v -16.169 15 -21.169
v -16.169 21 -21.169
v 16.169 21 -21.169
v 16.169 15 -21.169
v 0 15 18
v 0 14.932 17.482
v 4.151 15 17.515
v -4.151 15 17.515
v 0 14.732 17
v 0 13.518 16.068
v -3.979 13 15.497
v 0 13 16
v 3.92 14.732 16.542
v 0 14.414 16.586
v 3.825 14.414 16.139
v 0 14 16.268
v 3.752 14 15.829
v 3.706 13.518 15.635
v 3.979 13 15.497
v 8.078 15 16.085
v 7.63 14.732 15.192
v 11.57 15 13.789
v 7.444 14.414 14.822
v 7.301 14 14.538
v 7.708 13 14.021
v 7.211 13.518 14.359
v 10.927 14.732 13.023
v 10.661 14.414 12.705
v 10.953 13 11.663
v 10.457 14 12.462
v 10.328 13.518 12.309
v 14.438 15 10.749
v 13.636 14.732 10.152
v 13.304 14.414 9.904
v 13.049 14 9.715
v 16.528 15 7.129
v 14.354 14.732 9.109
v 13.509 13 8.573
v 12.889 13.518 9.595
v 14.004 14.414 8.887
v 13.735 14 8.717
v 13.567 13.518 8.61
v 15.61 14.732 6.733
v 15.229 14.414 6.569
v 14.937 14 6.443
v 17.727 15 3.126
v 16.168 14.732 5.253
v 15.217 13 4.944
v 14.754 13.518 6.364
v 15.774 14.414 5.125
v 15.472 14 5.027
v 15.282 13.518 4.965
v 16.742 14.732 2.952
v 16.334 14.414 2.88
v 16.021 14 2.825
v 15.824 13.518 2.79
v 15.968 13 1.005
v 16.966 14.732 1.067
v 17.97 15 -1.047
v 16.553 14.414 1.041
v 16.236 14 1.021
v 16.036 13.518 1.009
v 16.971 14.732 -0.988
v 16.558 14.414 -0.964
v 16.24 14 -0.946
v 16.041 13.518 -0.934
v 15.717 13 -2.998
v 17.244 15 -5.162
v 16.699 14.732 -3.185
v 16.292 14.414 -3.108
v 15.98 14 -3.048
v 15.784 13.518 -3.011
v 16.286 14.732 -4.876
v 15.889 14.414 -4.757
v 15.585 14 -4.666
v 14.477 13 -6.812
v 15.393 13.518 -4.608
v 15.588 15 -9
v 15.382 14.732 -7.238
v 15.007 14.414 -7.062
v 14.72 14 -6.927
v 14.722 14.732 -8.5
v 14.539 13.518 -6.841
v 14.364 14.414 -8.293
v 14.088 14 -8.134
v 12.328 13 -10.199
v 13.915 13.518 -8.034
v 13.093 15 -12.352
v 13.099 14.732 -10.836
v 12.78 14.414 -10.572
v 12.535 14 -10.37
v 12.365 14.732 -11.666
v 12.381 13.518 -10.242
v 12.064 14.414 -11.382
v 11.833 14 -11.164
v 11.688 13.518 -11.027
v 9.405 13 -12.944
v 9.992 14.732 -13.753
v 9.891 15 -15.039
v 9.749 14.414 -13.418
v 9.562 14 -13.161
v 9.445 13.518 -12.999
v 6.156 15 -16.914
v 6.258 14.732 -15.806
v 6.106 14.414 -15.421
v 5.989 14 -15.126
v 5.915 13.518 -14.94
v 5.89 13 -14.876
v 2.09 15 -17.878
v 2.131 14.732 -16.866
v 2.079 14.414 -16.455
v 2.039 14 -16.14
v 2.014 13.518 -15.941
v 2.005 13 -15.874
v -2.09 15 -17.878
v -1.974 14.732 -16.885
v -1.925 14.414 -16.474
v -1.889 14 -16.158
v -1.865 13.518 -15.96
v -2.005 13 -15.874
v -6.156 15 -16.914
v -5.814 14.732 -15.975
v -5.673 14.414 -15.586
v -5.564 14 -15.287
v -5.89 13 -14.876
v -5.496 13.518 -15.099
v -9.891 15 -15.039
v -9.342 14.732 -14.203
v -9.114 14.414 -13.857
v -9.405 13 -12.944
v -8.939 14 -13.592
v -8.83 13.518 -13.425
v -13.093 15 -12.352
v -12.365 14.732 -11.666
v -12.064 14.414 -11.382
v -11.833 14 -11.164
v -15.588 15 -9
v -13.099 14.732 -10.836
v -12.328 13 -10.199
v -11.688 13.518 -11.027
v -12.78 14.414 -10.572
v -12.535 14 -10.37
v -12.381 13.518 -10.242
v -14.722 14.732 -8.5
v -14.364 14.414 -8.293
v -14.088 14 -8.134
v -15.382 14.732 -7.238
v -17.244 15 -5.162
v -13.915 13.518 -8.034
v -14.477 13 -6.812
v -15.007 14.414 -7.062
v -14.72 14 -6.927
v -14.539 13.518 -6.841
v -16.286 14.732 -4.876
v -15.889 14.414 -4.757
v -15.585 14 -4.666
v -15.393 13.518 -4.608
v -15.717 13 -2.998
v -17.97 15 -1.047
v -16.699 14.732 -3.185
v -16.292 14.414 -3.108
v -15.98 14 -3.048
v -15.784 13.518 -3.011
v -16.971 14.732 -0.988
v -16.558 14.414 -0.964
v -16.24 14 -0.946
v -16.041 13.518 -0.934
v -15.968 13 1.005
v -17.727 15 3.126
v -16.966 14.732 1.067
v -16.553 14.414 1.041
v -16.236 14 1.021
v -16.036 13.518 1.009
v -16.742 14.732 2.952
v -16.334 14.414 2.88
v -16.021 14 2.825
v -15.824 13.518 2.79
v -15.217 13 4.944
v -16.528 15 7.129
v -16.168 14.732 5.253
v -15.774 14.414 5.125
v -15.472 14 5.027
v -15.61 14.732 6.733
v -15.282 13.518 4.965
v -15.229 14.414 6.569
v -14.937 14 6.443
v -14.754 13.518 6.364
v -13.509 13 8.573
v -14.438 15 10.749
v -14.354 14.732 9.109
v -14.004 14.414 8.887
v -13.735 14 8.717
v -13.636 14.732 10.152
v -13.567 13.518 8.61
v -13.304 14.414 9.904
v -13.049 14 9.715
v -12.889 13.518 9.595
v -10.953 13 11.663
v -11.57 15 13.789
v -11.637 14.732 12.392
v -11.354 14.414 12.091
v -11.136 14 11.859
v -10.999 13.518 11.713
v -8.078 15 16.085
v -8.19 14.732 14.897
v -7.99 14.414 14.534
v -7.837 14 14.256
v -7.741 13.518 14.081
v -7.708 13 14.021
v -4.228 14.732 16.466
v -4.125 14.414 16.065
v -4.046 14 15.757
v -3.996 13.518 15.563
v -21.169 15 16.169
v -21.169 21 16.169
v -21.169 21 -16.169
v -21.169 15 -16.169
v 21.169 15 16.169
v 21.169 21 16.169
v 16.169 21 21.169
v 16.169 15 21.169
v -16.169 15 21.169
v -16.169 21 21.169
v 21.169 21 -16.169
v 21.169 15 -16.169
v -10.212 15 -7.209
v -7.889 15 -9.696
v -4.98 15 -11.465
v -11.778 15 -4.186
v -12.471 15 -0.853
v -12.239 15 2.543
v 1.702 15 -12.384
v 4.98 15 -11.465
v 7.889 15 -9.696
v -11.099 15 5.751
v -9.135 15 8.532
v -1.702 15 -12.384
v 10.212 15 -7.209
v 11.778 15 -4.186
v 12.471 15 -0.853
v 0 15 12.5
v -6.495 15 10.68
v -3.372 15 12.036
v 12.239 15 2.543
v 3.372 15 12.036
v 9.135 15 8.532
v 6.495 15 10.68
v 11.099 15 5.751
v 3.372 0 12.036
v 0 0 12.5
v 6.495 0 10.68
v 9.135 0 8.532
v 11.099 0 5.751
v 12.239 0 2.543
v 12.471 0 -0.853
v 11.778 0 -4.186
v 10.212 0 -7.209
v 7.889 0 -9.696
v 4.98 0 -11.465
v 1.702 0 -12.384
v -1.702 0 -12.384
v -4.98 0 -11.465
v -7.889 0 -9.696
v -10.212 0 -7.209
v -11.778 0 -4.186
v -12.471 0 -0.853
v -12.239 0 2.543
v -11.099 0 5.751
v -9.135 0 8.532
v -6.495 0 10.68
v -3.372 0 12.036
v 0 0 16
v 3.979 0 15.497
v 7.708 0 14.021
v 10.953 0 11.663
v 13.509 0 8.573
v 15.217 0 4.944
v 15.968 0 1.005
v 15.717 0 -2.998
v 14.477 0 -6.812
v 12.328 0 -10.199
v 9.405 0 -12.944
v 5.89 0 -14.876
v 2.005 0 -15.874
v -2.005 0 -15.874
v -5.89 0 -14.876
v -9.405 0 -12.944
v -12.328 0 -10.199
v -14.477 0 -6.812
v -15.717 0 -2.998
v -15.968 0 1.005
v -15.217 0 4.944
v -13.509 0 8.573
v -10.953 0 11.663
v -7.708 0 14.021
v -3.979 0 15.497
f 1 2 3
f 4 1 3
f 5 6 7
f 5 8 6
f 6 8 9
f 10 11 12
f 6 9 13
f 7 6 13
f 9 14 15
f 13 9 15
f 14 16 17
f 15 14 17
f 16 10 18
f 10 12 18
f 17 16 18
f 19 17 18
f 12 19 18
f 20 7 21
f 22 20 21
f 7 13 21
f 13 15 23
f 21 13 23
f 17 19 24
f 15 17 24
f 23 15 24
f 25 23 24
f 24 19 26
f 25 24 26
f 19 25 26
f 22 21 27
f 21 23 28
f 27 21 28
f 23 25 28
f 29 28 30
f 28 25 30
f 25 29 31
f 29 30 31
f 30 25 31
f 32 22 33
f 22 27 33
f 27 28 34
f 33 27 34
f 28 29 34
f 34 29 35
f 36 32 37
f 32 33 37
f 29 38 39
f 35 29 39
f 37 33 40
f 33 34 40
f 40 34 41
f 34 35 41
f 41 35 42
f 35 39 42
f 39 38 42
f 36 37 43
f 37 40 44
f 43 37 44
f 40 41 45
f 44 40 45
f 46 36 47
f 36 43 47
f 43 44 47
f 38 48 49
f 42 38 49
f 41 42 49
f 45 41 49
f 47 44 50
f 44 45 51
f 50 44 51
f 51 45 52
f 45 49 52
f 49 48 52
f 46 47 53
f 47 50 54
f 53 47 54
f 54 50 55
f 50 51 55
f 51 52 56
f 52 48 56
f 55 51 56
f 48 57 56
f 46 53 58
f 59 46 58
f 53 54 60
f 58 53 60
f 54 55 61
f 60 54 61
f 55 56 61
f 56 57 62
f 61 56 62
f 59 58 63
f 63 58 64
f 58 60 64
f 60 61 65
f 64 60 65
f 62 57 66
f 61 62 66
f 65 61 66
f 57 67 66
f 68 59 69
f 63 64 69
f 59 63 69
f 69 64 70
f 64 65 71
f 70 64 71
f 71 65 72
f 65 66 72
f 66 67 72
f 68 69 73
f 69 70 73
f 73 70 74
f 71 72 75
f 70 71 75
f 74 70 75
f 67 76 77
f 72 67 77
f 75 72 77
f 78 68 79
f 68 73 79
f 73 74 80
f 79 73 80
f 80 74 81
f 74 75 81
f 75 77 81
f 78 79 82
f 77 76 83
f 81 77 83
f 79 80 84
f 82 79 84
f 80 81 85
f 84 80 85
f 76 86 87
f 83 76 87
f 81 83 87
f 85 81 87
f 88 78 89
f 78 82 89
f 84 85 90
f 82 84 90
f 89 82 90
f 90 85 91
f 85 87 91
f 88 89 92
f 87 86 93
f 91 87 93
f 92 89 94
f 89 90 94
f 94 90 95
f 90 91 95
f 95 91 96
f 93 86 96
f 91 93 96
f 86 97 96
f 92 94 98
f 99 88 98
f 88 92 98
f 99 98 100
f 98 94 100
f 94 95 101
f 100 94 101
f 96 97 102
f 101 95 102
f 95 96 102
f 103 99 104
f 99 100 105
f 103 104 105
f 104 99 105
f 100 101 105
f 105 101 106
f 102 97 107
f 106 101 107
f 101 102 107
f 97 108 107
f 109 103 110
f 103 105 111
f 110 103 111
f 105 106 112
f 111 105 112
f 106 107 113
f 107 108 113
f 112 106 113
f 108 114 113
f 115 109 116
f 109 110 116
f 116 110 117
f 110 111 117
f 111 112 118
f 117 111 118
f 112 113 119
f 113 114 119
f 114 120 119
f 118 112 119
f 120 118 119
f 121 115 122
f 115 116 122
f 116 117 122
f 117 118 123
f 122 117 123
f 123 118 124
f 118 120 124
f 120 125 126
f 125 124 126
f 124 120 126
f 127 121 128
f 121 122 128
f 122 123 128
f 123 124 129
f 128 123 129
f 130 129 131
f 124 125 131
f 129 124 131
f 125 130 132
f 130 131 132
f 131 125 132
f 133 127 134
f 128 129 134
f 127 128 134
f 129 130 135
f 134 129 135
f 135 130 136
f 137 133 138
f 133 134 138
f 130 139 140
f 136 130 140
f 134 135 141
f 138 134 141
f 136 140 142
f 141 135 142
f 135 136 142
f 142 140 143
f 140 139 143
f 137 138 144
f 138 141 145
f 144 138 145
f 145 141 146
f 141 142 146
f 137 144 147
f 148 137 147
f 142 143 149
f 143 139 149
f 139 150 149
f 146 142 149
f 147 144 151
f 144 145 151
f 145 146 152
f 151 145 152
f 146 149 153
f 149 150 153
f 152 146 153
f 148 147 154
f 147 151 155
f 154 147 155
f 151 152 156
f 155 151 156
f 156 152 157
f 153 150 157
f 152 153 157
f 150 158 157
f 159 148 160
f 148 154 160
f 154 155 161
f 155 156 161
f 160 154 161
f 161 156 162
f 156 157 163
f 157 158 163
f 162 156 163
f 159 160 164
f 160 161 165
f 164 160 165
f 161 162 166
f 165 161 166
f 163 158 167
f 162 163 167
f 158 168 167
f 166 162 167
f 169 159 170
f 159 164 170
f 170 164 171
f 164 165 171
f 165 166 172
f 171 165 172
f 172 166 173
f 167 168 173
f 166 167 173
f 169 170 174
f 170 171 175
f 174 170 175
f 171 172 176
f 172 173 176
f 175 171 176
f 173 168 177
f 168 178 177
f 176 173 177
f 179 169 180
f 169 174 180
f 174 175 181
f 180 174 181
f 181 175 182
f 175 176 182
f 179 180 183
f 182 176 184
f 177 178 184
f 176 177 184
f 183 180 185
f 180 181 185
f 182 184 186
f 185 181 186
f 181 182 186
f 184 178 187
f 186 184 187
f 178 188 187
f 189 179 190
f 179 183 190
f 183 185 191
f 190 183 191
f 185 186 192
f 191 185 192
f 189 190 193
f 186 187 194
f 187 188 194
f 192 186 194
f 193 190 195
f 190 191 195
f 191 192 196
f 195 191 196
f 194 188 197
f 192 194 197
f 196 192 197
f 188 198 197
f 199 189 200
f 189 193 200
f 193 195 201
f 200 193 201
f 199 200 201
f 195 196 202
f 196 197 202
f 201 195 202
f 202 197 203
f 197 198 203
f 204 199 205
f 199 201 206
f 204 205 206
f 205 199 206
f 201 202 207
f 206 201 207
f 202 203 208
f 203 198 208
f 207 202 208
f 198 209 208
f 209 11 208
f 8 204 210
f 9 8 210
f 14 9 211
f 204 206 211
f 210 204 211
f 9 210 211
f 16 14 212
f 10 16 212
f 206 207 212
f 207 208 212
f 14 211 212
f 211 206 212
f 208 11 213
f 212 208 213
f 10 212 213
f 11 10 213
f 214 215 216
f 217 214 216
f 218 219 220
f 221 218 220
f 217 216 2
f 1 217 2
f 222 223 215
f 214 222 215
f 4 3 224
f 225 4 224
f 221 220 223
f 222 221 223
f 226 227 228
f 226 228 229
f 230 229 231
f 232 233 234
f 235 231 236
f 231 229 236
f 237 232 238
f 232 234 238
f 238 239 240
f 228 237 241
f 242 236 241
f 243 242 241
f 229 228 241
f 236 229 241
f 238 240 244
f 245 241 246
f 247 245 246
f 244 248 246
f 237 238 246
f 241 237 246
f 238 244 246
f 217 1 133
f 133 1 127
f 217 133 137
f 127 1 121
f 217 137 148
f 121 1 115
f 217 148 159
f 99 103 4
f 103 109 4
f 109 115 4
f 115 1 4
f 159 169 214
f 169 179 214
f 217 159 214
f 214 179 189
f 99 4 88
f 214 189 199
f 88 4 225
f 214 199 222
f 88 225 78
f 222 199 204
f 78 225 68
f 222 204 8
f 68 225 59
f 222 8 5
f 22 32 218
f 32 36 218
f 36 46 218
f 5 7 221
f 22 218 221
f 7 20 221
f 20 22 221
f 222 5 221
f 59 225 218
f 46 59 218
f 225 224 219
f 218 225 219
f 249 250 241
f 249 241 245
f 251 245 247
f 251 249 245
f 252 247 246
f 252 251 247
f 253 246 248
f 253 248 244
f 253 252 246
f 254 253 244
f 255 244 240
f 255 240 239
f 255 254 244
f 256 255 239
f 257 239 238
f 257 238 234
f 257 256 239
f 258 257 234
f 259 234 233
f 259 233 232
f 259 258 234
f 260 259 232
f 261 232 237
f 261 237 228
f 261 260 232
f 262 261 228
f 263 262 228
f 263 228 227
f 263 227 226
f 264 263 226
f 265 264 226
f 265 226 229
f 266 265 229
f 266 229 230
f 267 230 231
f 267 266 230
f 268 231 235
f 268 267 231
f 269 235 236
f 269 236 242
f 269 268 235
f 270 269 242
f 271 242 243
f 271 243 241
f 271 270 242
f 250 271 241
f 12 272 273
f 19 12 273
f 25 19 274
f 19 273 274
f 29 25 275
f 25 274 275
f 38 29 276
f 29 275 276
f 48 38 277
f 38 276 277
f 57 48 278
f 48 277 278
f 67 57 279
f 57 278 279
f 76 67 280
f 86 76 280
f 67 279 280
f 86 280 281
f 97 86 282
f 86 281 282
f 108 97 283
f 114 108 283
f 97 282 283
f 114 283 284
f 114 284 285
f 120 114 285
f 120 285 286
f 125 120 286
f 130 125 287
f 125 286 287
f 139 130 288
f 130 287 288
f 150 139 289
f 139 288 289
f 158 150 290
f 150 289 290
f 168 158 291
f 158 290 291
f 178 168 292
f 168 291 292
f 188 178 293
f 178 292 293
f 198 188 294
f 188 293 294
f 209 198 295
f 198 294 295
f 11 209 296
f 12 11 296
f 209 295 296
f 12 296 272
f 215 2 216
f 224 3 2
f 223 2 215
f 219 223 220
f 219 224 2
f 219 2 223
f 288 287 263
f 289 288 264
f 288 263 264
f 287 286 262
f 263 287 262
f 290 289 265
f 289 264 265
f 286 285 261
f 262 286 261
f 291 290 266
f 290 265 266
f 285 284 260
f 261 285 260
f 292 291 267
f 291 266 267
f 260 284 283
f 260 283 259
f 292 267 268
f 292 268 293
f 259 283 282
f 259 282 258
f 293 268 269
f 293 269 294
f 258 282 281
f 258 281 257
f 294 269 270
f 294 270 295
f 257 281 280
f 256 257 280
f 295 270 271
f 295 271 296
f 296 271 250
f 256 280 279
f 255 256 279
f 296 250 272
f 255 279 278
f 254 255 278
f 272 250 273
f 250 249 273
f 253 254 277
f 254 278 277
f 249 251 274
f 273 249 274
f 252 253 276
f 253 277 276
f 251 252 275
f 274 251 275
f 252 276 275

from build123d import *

# Parameters (mm, degrees)
SKETCH1_R          = 16
SKETCH1_R_2        = 12.5
EXTRUDE1_DEPTH     = 15
SKETCH2_R          = 30
EXTRUDE2_DEPTH     = 6
FILLET1_R          = 2
SKETCH5_W          = 68.7469374
SKETCH5_H          = 68.7469374
CUT_EXTRUDE2_DEPTH = 10


with BuildPart() as part:
    # Sketch1 → Extrude1 (new body)
    with BuildSketch(Plane(origin=(0, 0, 0), x_dir=(1, 0, 0), z_dir=(0, 1, 0))):
        with Locations(Location((0, 0, 0), (0, 0, 270))):
            Circle(SKETCH1_R)
        with Locations(Location((0, 0, 0), (0, 0, 270))):
            Circle(SKETCH1_R_2, mode=Mode.SUBTRACT)
    extrude(amount=EXTRUDE1_DEPTH)

    # Sketch2 → Extrude2 (add)
    with BuildSketch(Plane(origin=(0, 15, 0), x_dir=(1, 0, 0), z_dir=(0, 1, 0))):
        with Locations(Location((0, 0, 0), (0, 0, 270))):
            Circle(SKETCH2_R)
    extrude(amount=EXTRUDE2_DEPTH)

    # Fillet1
    fillet1_edges = [part.edges().sort_by_distance(p)[0] for p in [
        (0, 15, -16),
    ]]
    fillet(fillet1_edges, radius=FILLET1_R)

    # Sketch5 → Cut-Extrude2 (cut)
    with BuildSketch(Plane(origin=(0, 21, 0), x_dir=(1, 0, 0), z_dir=(0, 1, 0))):
        Rectangle(SKETCH5_W, SKETCH5_H)
        Polygon((-21.16926222, 16.16926222), (-16.16926222, 21.16926222), (16.16926222, 21.16926222), (21.16926222, 16.16926222), (21.16926222, -16.16926222), (16.16926222, -21.16926222), (-16.16926222, -21.16926222), (-21.16926222, -16.16926222), align=None, mode=Mode.SUBTRACT)
    extrude(amount=-CUT_EXTRUDE2_DEPTH, mode=Mode.SUBTRACT)


solid = part.part
